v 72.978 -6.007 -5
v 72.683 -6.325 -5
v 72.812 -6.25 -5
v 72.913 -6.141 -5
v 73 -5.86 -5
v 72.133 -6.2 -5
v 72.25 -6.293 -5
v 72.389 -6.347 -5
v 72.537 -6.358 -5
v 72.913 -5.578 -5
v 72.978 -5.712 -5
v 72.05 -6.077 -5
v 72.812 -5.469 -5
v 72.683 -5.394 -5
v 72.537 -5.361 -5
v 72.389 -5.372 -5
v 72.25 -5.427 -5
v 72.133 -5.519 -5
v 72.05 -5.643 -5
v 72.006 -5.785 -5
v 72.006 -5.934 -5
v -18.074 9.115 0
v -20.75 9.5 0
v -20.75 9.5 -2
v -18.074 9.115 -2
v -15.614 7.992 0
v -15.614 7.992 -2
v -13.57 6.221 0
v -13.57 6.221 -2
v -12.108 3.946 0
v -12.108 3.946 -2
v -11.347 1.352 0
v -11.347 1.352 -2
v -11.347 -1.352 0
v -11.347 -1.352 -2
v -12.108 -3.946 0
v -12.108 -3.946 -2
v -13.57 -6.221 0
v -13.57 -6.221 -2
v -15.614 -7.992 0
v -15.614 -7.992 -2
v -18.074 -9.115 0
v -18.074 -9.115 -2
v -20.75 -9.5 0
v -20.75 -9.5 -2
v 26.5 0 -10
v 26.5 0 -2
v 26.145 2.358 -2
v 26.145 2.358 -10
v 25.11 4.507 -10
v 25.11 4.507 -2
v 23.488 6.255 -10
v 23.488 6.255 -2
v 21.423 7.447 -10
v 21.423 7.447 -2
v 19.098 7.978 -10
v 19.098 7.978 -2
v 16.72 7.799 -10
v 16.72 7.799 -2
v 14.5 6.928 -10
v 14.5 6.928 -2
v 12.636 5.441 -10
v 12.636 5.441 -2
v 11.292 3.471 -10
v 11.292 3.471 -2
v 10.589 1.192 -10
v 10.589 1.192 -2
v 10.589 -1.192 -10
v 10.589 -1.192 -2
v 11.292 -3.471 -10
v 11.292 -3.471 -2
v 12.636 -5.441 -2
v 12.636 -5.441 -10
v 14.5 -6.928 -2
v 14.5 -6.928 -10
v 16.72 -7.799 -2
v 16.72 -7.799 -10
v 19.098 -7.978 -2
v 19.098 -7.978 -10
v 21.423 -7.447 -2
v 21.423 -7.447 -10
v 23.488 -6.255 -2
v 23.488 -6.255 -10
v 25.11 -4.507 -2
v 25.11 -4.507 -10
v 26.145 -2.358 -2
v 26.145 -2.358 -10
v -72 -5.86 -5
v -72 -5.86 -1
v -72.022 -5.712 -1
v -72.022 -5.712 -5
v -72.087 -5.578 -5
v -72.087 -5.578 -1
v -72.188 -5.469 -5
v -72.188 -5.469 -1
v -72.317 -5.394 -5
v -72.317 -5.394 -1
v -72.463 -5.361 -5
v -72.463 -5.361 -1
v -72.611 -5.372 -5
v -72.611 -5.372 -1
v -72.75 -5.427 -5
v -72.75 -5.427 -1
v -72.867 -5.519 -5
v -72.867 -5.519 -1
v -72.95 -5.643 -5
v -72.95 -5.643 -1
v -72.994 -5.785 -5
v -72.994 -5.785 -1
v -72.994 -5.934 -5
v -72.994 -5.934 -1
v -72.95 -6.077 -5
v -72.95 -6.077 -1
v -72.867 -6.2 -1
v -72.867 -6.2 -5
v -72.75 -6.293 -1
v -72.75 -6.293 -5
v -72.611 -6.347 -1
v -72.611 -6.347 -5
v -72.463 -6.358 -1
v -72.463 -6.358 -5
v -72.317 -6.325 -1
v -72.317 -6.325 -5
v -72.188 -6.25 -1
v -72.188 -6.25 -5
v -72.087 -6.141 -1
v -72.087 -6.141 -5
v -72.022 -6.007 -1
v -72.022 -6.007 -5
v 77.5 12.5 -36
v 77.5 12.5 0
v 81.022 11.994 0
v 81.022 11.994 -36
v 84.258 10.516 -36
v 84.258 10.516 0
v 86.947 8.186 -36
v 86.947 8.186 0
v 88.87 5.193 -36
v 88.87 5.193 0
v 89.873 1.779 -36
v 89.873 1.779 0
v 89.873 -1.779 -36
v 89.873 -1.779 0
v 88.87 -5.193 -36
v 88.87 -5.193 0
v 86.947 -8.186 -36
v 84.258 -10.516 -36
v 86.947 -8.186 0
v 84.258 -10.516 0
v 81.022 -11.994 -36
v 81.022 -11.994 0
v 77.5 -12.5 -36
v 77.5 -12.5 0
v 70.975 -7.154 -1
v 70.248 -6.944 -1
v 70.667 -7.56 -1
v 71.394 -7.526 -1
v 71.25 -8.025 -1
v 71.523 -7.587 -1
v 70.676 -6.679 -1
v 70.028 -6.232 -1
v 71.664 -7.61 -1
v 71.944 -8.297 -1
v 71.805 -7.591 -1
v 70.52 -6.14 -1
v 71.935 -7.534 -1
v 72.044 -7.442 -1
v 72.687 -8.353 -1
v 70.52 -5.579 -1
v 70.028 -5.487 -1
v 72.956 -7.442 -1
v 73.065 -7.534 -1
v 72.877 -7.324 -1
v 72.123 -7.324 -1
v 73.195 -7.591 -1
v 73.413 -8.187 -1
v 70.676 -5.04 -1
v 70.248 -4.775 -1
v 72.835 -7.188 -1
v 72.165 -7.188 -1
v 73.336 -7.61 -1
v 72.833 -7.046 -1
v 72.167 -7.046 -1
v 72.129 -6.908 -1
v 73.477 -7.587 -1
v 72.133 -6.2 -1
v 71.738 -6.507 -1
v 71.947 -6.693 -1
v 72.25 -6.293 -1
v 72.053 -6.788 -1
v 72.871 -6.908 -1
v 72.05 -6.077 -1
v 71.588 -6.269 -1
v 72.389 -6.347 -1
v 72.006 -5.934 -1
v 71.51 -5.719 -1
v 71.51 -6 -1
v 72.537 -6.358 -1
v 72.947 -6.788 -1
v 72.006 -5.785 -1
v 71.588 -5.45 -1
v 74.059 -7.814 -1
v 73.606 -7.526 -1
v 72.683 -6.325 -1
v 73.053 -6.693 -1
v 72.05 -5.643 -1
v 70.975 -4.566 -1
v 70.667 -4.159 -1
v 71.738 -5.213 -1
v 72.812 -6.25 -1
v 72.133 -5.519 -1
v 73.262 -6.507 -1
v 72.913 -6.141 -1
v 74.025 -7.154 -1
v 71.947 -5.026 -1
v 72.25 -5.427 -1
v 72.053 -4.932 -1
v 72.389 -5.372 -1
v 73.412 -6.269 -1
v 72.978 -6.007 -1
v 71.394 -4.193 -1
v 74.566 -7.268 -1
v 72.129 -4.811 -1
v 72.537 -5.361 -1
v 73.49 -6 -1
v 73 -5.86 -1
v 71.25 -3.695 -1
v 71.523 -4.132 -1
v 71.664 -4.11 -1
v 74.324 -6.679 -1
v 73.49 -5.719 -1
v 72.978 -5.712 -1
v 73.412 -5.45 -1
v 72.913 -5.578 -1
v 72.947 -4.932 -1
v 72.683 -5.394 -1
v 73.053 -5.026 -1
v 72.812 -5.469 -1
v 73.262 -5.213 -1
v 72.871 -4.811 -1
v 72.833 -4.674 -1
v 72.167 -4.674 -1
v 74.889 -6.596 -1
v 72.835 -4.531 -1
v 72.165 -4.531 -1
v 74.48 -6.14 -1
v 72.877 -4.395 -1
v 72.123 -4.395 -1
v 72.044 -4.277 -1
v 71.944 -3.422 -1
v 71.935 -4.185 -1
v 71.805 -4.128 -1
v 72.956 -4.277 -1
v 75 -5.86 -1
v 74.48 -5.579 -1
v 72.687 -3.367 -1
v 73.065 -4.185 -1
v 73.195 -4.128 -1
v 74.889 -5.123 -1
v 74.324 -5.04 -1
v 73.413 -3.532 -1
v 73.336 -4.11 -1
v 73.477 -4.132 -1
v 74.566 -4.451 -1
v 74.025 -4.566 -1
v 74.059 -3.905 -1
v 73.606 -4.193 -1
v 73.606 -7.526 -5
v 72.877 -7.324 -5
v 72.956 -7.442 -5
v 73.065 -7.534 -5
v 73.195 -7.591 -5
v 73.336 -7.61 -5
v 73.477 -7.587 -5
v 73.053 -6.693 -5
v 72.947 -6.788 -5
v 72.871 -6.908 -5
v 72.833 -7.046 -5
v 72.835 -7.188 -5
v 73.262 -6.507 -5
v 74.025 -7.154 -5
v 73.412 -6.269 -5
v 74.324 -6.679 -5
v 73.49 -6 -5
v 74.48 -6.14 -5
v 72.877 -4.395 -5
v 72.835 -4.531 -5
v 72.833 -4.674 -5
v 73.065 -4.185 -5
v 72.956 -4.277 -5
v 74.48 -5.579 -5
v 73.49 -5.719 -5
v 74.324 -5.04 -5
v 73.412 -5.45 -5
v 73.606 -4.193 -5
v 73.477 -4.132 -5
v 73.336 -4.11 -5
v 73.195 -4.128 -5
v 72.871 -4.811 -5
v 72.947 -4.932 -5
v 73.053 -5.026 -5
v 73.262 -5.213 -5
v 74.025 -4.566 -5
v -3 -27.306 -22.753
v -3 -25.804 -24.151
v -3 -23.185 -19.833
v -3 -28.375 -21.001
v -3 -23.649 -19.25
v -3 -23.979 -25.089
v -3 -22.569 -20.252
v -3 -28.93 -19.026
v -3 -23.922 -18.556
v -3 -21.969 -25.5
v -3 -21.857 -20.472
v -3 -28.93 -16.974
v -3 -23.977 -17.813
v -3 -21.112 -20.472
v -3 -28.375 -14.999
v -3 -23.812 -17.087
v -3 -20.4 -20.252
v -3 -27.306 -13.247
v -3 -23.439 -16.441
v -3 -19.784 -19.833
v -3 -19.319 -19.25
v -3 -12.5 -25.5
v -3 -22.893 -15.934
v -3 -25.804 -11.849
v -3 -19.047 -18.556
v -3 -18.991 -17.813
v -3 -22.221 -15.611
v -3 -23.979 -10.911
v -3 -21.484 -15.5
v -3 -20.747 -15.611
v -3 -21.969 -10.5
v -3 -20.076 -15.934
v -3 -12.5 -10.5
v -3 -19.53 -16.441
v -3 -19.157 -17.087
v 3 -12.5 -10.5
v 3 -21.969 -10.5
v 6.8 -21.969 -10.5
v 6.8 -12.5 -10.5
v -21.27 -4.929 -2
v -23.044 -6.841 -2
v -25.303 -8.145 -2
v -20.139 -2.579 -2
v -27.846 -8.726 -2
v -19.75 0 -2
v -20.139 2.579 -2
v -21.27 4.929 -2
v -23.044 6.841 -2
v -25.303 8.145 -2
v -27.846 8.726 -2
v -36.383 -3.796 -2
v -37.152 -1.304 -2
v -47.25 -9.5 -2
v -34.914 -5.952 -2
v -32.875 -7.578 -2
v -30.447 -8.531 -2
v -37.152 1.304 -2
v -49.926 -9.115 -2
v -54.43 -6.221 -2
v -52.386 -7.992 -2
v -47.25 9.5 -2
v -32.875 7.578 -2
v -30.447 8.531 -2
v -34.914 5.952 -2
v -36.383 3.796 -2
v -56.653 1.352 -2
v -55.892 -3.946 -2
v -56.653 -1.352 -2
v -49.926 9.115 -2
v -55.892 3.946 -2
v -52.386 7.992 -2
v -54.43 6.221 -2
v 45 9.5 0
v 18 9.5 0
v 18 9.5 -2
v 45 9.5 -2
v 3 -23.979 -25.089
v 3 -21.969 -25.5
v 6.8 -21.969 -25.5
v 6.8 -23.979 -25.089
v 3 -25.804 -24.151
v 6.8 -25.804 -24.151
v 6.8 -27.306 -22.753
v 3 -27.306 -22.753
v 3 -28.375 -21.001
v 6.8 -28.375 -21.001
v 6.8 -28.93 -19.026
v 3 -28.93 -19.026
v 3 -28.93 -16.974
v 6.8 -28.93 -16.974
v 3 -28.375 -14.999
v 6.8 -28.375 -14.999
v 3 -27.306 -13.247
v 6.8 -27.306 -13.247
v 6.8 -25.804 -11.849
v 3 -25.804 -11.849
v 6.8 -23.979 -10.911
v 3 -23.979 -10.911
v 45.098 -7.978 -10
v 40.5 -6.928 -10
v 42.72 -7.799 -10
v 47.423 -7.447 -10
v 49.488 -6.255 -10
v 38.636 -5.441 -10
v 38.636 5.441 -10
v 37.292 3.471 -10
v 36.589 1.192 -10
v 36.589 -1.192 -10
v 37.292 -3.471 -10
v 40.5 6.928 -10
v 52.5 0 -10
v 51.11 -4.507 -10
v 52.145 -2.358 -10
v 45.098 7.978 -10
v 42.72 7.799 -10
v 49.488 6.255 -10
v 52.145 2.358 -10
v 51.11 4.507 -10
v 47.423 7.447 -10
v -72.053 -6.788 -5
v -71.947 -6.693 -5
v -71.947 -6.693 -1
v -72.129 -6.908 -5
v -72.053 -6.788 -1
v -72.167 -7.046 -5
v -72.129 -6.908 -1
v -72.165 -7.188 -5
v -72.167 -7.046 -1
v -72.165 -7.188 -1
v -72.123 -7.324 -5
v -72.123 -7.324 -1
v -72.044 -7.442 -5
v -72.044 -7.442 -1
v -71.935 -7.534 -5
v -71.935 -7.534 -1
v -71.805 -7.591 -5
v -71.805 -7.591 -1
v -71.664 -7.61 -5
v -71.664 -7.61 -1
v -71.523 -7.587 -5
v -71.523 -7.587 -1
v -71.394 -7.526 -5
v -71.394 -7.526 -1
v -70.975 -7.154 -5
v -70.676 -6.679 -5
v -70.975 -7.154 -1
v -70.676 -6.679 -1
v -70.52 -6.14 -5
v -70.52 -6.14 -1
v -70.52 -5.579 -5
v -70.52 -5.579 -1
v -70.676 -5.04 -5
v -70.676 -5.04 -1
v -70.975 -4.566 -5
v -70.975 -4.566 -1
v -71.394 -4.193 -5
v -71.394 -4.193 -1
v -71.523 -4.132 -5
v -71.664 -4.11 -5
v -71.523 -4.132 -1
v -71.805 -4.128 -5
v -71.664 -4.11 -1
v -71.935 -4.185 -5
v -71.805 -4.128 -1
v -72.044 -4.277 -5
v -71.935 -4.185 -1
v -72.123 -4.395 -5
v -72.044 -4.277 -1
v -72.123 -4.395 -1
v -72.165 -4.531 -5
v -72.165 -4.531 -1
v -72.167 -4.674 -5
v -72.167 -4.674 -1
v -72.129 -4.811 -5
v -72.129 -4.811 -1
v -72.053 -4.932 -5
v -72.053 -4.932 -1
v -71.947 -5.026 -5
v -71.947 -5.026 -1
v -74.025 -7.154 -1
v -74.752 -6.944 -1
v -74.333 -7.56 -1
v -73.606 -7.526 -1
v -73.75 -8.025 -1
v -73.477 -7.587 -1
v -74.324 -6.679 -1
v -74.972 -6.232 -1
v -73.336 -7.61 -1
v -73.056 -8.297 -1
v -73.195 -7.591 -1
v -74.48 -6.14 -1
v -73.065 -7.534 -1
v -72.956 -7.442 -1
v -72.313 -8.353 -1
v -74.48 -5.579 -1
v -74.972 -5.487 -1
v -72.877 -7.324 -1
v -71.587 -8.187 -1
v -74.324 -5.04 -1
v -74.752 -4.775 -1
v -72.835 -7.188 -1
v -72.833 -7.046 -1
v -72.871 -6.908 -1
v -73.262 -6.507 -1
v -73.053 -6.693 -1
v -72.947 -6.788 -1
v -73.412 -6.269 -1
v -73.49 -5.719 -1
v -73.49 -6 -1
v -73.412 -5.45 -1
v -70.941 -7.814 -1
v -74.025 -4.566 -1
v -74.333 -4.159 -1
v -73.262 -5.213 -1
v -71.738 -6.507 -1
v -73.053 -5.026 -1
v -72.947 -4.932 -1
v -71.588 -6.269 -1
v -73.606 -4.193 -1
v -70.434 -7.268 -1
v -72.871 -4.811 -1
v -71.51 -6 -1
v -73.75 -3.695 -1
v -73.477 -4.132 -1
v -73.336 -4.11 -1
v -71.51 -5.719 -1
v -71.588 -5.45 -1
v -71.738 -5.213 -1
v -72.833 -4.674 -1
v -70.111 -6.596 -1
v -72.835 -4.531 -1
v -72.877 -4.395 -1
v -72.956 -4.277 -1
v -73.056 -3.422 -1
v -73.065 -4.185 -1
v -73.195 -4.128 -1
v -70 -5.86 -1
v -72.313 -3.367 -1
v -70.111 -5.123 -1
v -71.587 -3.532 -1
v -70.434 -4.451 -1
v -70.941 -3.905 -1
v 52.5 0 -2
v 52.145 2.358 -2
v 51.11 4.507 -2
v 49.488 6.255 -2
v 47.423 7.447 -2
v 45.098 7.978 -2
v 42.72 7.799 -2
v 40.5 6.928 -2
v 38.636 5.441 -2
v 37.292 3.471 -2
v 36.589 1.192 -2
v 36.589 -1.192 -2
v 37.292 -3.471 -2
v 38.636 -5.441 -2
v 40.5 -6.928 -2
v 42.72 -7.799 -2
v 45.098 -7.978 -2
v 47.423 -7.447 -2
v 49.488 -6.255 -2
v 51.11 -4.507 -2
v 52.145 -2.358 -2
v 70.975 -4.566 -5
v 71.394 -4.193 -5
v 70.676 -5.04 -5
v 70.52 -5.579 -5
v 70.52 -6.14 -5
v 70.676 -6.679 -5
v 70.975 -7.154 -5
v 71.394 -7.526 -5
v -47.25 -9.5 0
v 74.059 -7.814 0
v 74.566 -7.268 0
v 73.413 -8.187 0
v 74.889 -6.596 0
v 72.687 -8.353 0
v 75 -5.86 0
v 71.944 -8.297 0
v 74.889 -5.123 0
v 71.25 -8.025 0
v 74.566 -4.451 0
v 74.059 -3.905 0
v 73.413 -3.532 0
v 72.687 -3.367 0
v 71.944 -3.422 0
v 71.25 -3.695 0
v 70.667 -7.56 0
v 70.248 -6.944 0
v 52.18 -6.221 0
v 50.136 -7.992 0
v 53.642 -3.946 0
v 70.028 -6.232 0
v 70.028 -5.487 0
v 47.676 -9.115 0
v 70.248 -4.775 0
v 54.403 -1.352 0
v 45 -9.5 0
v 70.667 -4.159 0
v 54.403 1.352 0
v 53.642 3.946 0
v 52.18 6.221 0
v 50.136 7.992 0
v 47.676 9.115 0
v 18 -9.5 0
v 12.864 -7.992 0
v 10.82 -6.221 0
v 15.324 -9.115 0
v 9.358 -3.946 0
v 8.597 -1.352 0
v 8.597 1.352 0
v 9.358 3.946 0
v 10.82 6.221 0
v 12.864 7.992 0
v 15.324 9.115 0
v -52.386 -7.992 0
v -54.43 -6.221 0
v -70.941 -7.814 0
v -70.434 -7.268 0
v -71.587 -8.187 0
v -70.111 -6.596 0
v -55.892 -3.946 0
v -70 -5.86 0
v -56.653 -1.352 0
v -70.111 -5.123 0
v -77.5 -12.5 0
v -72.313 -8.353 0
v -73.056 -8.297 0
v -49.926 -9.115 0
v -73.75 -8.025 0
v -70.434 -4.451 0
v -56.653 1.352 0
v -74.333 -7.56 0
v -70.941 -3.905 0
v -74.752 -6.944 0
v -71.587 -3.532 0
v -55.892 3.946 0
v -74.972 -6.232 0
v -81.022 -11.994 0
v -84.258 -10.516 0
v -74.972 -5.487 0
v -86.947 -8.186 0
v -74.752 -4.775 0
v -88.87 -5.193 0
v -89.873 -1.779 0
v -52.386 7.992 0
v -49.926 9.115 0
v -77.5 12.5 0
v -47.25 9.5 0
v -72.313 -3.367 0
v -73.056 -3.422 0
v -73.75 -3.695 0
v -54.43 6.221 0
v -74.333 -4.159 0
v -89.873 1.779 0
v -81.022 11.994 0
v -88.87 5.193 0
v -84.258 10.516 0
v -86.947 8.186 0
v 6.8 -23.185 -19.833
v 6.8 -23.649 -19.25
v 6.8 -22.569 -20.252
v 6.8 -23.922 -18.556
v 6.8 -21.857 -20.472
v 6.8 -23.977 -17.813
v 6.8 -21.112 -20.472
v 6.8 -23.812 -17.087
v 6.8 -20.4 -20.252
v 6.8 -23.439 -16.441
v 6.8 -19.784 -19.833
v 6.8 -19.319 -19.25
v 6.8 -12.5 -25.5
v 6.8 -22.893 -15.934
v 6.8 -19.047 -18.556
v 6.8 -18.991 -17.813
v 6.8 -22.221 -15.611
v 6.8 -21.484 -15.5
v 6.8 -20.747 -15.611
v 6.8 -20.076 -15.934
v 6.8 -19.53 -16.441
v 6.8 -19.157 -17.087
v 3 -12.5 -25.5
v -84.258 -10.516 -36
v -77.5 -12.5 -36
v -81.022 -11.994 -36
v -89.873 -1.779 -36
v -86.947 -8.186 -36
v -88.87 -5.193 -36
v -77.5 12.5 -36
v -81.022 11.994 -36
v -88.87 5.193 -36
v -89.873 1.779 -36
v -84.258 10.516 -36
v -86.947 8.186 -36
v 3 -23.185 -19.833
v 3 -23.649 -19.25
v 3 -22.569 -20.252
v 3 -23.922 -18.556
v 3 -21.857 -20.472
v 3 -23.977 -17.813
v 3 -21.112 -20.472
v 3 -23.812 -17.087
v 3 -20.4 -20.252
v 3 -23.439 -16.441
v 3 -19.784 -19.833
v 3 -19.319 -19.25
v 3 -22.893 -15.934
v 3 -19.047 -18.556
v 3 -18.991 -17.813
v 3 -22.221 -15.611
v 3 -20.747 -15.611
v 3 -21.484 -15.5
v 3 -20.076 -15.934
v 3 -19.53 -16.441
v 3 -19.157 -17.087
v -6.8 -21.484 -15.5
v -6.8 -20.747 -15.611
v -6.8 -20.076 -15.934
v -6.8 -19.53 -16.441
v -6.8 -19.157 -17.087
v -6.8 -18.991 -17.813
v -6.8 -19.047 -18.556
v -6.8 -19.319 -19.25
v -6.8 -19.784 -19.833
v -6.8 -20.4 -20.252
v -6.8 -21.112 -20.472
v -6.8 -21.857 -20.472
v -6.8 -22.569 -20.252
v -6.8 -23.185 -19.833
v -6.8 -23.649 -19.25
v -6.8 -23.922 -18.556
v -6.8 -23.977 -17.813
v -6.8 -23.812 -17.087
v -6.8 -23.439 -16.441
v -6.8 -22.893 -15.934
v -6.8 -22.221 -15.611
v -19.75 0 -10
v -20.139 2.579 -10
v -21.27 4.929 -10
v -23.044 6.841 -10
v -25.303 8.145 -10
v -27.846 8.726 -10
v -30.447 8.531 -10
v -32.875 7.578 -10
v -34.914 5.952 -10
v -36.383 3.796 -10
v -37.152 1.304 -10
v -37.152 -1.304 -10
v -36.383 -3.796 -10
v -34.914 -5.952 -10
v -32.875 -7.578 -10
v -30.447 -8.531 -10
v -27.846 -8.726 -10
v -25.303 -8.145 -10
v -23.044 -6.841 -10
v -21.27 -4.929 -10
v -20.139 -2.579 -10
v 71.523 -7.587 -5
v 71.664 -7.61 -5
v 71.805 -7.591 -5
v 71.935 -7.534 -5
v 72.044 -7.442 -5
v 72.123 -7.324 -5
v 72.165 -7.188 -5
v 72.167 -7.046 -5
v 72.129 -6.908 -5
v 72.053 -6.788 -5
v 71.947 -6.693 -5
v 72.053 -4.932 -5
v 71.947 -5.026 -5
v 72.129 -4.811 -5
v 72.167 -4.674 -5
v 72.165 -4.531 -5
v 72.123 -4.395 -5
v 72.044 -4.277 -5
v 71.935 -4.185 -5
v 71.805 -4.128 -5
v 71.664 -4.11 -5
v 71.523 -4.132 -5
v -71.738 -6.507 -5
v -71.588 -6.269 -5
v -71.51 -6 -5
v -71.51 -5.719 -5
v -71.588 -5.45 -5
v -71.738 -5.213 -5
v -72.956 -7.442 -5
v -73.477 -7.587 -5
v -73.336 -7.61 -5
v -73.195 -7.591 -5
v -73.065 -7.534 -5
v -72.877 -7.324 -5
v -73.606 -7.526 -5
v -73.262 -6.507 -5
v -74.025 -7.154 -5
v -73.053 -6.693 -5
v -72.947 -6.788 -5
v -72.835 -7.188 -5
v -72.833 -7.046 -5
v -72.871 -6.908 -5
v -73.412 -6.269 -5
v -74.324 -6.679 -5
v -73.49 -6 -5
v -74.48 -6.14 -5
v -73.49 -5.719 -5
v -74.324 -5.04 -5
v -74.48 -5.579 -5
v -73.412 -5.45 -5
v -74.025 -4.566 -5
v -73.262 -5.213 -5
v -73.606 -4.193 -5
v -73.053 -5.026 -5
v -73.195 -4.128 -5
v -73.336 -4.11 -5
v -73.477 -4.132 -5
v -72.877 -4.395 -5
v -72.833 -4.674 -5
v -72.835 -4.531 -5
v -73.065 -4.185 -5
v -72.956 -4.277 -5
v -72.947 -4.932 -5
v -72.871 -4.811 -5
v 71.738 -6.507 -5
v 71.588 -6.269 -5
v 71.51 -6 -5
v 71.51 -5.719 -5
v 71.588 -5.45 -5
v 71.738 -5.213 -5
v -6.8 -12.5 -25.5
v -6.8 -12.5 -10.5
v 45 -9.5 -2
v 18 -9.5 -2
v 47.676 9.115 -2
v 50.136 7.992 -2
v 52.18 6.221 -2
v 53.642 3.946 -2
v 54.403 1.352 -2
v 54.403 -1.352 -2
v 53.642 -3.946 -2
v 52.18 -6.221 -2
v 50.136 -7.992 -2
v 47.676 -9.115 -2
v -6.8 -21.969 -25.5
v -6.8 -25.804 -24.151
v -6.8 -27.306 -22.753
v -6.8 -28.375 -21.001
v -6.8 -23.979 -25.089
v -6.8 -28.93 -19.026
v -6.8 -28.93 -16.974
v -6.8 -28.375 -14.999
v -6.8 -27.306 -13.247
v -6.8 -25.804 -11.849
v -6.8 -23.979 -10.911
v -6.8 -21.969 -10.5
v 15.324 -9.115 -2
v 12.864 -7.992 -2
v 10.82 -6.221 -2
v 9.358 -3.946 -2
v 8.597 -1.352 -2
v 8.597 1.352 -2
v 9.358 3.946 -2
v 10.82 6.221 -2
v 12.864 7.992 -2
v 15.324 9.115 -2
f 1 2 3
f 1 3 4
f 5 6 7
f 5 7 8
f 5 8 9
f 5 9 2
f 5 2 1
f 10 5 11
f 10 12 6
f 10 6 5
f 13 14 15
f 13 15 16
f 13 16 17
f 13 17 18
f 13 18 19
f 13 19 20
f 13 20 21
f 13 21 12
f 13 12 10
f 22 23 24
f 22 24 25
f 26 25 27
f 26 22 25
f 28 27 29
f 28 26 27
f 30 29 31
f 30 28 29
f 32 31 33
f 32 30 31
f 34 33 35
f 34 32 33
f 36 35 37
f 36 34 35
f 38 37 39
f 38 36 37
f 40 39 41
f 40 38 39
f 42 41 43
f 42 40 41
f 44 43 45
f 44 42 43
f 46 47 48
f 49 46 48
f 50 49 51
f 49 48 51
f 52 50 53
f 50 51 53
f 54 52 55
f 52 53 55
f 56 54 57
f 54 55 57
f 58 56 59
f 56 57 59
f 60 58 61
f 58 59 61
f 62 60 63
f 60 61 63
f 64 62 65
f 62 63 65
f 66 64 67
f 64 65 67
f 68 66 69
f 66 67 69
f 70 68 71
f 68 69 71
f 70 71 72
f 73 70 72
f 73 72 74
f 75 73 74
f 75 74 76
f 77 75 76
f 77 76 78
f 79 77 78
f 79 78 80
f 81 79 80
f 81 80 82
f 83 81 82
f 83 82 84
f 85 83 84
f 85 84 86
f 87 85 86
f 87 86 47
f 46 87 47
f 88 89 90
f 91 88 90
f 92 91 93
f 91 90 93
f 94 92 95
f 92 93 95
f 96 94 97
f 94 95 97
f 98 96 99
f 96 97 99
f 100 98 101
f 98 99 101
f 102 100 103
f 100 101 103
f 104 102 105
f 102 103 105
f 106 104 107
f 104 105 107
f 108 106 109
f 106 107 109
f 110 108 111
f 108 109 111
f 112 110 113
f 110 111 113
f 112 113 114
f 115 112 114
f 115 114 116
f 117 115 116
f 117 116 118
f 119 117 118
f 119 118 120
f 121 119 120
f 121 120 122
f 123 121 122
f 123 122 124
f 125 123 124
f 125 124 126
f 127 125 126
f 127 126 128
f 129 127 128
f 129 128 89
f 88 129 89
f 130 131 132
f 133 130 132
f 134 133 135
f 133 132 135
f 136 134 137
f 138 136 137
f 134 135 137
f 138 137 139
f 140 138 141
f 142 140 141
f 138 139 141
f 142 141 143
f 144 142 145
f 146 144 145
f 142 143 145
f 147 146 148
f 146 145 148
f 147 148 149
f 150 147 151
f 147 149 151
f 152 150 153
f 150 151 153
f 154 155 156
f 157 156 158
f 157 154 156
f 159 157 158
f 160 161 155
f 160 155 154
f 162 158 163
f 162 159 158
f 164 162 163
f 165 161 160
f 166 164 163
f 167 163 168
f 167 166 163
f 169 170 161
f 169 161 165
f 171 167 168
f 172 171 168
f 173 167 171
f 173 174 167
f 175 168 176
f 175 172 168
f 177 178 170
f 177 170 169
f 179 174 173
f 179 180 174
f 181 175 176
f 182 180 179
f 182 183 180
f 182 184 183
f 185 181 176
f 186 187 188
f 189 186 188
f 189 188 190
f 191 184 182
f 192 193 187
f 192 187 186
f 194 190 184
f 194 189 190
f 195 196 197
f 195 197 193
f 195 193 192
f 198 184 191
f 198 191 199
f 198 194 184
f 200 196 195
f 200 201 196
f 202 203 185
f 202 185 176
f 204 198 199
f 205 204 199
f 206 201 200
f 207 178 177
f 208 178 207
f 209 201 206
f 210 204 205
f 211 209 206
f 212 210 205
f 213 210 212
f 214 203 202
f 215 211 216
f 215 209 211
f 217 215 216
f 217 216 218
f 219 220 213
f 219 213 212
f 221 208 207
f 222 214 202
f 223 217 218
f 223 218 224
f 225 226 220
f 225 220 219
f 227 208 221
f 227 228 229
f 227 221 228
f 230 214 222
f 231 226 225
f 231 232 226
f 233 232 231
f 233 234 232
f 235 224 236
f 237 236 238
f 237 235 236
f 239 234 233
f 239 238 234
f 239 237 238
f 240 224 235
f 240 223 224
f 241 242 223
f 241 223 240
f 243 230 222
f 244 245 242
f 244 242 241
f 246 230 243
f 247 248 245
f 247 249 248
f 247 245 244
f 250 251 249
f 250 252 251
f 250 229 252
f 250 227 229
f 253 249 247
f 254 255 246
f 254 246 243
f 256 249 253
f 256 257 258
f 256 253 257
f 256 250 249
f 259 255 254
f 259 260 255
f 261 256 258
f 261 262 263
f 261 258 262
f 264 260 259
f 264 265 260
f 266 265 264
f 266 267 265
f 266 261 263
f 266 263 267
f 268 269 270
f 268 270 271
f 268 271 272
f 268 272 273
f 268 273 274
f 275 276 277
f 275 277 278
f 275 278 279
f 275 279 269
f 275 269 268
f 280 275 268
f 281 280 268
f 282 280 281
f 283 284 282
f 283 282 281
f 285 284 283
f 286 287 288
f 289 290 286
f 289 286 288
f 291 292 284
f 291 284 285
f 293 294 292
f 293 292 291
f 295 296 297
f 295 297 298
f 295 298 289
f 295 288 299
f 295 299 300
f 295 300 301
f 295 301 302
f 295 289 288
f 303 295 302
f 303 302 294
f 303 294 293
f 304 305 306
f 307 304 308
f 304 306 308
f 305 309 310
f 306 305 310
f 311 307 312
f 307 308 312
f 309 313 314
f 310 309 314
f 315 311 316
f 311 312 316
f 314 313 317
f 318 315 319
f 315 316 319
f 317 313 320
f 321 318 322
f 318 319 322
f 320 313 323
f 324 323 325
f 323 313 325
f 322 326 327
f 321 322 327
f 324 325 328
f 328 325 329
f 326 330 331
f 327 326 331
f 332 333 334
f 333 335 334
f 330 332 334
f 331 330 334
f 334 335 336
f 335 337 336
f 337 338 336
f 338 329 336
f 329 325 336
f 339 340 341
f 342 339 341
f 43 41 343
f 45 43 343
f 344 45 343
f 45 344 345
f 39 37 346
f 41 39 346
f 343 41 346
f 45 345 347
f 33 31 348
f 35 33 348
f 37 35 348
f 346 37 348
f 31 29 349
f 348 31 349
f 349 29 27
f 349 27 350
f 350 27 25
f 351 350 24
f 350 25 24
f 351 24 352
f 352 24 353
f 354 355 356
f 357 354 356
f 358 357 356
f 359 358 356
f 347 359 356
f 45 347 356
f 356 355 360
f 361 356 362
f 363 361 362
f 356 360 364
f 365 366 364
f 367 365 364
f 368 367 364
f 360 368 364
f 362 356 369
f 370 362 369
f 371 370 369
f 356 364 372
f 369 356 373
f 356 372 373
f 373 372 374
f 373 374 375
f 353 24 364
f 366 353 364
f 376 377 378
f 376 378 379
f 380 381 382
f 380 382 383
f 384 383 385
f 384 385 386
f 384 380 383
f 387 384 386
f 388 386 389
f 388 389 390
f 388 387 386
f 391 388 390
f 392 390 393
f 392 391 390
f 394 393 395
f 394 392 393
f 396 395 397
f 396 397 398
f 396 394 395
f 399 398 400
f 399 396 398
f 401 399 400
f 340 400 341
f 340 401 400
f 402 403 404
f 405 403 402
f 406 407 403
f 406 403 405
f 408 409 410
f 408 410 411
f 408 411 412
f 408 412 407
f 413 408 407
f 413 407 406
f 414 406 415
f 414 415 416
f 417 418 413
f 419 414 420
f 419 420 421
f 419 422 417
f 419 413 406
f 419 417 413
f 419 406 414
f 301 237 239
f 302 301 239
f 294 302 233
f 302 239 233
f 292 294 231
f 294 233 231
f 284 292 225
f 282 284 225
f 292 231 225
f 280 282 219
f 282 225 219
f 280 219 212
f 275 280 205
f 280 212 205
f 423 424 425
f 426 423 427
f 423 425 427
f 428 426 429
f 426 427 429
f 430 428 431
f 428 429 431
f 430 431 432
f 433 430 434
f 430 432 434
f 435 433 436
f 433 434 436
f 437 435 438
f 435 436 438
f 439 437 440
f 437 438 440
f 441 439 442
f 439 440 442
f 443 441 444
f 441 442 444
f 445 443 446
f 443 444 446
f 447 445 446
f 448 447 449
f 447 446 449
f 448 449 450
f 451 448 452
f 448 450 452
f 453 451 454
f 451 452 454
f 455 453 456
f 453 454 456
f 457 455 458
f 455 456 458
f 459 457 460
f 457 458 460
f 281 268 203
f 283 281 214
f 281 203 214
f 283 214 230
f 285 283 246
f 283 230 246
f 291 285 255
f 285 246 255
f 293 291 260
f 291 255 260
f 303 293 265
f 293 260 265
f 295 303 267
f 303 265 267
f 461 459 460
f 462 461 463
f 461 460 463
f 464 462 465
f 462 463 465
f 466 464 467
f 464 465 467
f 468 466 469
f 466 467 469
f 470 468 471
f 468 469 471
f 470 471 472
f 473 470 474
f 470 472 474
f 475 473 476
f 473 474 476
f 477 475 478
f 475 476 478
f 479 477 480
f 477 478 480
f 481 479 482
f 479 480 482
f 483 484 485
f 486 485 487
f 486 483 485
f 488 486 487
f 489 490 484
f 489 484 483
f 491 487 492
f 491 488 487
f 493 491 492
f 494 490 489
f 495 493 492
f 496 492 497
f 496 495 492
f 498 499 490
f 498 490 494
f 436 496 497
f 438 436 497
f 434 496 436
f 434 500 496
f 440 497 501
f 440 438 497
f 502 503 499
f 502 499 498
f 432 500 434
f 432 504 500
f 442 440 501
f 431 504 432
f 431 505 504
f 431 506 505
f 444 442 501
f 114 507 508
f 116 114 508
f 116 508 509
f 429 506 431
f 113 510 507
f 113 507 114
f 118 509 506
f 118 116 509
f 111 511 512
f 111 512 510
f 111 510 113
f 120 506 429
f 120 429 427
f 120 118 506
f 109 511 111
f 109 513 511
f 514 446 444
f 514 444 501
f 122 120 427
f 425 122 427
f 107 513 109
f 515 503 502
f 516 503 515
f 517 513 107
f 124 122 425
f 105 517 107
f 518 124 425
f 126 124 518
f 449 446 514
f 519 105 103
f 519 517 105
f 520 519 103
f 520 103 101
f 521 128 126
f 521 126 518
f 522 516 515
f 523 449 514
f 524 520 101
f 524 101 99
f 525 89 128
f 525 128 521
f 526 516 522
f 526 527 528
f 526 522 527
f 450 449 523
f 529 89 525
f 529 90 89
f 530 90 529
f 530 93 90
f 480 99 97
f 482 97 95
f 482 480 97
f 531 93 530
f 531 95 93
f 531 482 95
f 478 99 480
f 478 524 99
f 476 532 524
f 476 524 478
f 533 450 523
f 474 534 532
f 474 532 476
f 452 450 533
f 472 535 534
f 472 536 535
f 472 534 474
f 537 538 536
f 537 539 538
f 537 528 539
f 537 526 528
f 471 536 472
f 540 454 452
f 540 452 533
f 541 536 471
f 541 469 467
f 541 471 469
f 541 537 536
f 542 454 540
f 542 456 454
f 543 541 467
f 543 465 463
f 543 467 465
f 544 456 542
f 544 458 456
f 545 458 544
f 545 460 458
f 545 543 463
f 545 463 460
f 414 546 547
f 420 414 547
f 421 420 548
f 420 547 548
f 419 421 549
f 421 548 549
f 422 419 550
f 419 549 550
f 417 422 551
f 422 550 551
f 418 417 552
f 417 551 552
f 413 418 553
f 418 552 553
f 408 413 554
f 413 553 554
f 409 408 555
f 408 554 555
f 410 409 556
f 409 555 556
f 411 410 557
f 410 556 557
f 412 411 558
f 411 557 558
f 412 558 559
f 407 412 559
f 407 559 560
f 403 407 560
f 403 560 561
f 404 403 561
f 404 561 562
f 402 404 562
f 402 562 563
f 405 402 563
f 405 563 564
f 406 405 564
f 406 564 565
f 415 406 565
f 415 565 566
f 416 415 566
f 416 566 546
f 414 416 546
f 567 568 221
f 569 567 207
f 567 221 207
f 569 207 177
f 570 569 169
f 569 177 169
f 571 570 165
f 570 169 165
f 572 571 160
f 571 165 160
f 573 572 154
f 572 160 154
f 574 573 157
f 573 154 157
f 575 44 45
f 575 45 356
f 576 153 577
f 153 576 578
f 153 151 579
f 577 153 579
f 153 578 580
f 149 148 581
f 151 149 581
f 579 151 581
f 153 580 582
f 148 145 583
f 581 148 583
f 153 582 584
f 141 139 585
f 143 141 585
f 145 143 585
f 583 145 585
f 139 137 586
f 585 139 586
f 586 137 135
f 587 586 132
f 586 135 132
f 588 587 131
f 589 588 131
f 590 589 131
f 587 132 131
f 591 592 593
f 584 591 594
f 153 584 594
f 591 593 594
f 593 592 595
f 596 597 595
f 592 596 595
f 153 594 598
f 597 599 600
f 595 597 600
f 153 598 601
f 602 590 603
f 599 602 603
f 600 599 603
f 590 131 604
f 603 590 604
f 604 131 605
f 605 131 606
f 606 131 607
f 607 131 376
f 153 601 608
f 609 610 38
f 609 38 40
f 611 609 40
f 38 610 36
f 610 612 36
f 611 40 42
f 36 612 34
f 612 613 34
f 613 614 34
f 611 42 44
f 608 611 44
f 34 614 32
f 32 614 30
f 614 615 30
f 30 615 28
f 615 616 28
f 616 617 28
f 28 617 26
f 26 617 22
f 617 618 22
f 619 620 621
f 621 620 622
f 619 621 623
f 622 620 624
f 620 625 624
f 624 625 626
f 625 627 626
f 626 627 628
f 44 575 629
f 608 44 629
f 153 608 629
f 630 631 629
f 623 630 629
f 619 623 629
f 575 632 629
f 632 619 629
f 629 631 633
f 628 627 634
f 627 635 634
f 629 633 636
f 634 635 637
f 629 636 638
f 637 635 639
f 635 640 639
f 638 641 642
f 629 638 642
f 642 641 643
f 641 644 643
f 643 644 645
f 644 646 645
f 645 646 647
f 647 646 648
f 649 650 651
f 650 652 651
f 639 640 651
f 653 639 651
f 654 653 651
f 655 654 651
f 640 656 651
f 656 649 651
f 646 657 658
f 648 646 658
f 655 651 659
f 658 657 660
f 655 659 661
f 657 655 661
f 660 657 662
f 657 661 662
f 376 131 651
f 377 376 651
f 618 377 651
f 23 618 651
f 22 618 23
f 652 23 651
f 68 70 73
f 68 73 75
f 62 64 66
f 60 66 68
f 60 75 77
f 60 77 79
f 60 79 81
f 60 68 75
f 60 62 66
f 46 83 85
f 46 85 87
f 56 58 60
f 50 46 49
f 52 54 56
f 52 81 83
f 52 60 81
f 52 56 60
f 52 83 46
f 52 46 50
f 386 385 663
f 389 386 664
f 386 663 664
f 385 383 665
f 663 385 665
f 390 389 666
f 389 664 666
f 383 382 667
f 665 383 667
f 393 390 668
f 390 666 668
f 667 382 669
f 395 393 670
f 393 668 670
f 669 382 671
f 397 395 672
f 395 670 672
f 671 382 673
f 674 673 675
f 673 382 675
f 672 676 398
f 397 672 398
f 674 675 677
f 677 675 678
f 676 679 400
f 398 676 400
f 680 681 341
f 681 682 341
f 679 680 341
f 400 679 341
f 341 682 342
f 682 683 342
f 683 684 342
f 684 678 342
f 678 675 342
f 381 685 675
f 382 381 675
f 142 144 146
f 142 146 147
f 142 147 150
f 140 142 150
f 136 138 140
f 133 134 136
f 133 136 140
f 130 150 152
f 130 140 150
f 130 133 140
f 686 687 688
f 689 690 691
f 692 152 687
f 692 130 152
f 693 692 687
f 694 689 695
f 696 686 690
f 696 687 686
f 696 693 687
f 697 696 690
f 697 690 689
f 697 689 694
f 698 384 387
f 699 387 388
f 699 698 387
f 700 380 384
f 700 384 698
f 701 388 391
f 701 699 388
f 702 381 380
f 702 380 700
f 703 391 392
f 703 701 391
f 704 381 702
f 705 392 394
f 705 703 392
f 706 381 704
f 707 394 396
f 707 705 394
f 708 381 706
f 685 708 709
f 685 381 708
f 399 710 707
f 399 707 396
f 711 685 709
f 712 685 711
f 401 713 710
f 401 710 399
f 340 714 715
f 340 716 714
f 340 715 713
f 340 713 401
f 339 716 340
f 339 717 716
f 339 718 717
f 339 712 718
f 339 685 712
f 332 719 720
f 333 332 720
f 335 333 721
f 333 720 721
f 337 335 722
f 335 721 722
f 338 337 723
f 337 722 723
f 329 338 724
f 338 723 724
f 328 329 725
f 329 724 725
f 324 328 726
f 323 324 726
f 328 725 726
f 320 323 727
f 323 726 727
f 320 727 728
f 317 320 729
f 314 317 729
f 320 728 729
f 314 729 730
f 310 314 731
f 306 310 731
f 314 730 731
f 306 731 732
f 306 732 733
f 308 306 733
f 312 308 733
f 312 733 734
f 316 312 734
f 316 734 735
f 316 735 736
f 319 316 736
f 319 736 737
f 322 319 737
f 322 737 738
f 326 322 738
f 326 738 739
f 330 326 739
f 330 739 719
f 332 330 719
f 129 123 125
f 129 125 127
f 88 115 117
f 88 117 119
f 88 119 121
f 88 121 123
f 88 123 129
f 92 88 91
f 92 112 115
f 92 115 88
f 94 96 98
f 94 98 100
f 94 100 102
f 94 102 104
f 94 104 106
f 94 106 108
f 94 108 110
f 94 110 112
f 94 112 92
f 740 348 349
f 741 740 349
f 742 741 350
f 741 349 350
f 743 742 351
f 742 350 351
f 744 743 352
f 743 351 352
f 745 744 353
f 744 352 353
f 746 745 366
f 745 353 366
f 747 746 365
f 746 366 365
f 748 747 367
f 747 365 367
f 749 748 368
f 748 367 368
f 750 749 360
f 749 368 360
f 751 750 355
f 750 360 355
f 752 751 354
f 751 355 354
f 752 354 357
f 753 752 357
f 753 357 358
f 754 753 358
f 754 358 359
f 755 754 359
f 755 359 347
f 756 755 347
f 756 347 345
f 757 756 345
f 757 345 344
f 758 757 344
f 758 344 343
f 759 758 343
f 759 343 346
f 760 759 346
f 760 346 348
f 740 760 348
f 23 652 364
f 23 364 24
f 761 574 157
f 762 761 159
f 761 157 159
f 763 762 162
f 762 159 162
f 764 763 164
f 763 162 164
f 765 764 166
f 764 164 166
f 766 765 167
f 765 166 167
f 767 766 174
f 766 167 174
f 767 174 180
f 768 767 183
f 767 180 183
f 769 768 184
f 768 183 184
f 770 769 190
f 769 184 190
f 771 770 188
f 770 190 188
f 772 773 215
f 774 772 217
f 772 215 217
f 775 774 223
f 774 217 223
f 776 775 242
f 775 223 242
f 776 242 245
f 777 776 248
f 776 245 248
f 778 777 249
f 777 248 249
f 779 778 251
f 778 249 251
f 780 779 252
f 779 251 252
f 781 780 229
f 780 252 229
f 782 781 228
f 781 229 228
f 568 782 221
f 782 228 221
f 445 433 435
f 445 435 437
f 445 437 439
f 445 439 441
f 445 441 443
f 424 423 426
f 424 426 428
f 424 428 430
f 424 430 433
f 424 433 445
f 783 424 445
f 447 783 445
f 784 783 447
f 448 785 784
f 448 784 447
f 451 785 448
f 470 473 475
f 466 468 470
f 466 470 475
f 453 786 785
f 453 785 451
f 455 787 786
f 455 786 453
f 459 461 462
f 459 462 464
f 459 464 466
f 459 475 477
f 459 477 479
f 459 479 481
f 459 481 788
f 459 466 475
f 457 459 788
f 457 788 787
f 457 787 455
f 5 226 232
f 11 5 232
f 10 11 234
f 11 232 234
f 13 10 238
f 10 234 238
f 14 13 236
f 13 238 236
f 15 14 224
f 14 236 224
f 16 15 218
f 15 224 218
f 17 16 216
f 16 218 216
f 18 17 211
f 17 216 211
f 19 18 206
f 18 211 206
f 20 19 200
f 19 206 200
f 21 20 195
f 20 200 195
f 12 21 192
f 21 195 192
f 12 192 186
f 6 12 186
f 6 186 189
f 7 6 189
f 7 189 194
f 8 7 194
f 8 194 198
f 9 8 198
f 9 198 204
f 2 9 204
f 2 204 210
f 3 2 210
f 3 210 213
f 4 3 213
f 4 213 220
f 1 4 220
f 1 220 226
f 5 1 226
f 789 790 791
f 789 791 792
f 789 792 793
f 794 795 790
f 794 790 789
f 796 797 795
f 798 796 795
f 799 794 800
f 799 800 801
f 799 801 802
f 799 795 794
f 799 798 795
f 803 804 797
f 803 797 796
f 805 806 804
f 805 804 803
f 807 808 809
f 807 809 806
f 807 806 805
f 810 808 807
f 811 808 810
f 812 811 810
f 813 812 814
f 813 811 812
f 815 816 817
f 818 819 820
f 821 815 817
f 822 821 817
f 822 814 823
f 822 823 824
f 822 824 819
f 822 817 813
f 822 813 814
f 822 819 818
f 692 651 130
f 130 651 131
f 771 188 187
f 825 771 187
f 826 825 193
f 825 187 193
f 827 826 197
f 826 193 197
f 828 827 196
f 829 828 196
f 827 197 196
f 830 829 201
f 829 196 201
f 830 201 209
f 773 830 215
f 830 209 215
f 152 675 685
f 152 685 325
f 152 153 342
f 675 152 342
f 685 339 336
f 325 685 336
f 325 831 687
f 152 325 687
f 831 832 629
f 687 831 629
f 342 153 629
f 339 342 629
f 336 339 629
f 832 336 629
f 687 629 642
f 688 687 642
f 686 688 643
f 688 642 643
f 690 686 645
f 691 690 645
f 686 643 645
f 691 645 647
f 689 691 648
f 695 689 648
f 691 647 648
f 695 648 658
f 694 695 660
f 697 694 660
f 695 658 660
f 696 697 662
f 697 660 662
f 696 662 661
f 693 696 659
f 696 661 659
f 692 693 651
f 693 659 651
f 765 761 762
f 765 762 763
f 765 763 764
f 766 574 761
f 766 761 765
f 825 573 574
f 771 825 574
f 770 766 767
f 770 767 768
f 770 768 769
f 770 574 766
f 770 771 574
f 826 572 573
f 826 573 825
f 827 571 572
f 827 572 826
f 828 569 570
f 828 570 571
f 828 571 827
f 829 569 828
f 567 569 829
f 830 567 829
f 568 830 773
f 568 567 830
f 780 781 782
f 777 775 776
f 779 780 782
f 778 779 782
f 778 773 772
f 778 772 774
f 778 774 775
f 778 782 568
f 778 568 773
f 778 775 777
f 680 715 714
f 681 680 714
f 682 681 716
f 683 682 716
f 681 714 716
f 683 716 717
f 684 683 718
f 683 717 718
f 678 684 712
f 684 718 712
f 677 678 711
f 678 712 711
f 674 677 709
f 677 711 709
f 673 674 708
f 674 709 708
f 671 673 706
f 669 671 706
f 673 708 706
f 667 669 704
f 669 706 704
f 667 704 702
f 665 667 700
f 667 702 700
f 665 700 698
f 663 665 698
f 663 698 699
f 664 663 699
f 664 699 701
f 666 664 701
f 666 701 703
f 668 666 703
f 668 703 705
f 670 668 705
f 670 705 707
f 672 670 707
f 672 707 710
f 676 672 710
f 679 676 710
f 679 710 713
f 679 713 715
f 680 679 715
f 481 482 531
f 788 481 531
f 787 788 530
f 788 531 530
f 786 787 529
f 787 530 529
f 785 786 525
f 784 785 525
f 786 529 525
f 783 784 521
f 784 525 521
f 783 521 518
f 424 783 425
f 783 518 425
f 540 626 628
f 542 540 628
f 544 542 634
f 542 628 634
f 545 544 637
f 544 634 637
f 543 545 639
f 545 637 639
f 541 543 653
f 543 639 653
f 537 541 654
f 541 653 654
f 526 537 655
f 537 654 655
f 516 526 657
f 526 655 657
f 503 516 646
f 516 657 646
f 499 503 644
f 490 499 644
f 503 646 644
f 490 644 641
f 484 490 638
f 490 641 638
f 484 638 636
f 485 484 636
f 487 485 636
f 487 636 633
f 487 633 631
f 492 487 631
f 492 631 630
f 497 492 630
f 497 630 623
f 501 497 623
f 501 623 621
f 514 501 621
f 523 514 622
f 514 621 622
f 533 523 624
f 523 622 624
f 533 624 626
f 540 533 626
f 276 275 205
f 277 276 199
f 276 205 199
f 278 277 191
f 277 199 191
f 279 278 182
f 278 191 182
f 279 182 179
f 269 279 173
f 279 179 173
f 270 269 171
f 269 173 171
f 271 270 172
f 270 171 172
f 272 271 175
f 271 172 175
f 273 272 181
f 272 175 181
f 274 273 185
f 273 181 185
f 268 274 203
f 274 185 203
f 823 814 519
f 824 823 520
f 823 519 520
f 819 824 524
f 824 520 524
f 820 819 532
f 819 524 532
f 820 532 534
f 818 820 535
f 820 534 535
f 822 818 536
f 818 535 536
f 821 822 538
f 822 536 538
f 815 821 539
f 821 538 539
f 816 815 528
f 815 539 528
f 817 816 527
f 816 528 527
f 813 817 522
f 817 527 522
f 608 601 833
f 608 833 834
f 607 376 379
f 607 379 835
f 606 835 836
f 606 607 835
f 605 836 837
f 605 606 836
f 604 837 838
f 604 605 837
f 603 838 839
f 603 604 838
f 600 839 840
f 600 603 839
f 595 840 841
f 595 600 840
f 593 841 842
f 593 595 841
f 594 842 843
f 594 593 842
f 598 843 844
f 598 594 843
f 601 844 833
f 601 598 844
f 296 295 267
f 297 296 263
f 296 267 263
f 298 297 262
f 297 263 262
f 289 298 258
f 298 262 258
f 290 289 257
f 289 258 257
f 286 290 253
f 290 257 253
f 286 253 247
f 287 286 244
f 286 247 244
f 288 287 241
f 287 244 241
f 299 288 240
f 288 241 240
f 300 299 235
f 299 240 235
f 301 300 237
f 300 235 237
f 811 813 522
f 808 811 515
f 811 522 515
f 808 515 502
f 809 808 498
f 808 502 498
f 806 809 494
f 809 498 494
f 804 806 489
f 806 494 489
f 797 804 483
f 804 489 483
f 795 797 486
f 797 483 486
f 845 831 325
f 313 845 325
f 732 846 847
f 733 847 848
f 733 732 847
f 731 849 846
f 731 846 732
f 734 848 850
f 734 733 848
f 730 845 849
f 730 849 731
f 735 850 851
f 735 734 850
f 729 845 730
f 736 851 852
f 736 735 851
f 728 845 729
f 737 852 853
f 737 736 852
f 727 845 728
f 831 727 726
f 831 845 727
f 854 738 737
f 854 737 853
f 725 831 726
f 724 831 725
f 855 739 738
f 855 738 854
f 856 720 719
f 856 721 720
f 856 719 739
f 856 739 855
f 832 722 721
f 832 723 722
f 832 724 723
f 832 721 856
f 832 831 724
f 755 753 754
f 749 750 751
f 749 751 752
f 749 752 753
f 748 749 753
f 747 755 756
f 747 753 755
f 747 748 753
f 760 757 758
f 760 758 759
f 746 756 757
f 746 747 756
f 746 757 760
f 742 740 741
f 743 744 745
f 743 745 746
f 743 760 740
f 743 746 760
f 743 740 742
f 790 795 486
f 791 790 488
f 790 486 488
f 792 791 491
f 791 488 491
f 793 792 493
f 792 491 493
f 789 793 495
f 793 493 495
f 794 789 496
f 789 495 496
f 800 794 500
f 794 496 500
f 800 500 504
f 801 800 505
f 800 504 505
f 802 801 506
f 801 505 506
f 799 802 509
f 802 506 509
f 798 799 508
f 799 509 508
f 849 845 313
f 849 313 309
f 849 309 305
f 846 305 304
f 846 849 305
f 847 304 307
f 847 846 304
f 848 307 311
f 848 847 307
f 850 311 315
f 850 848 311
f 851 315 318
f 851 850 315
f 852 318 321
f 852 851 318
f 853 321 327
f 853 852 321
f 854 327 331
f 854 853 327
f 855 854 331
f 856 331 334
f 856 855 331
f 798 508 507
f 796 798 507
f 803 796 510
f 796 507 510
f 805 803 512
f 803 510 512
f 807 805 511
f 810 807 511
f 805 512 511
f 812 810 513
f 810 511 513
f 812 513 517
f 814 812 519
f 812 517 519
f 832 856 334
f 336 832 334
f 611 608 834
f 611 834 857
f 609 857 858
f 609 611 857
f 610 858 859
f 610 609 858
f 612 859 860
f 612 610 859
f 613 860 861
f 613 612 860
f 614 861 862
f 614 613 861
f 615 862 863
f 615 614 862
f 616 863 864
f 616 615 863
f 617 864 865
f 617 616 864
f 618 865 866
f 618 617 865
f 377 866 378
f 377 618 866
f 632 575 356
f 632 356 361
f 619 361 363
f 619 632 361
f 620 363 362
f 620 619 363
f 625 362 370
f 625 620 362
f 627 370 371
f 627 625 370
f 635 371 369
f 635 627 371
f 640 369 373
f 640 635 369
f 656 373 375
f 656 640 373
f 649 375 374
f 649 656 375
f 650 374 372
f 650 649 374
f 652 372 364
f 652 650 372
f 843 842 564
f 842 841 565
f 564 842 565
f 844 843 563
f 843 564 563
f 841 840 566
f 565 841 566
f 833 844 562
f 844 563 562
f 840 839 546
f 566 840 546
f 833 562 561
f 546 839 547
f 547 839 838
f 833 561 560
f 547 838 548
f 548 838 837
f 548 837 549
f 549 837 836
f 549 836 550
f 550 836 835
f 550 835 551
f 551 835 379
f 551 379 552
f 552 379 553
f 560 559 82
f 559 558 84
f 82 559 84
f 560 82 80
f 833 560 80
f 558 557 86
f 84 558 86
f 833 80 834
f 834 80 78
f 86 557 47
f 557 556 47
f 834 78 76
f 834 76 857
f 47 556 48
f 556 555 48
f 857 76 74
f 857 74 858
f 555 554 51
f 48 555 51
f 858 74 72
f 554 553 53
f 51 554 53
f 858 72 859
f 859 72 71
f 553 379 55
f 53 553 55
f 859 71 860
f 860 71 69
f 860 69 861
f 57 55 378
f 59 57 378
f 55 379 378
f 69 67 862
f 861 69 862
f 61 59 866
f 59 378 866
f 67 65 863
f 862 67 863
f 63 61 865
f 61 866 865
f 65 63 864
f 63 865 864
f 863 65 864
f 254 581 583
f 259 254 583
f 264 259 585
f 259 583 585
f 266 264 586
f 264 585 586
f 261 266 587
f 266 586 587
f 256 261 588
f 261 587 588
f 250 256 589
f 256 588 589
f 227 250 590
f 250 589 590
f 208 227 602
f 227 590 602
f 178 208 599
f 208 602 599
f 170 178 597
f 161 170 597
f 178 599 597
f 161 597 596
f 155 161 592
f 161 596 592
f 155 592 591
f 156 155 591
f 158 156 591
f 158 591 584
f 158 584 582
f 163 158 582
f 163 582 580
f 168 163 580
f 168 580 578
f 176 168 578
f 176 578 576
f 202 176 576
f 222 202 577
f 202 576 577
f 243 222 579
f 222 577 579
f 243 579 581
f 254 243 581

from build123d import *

# Parameters (mm, degrees)
BOSS_EXTRUDE1_DEPTH     = 36
SKETCH3_R               = 8.75
SKETCH3_R_2             = 8
CUT_EXTRUDE1_DEPTH      = 10
CUT_EXTRUDE2_DEPTH      = 2
SKETCH5_R               = 2.5
CUT_EXTRUDE3_DEPTH      = 1
SKETCH6_R               = 0.5
CUT_EXTRUDE4_DEPTH      = 5
SKETCH7_W               = 3.8
SKETCH7_H               = 15
BOSS_EXTRUDE2_DEPTH     = 17
SKETCH8_R               = 2.5
CUT_EXTRUDE5_DEPTH      = 84.2
CUT_EXTRUDE5_DEPTH_BACK = 97.8


with BuildPart() as part:
    # Sketch1 → Boss-Extrude1 (new body)
    with BuildSketch(Plane.XY):
        with BuildLine():
            Line((-77.5, 12.5), (77.5, 12.5))
            ThreePointArc((77.5, 12.5), (90, 0), (77.5, -12.5))
            Line((77.5, -12.5), (-77.5, -12.5))
            ThreePointArc((-77.5, -12.5), (-90, 0), (-77.5, 12.5))
        make_face()
    extrude(amount=-BOSS_EXTRUDE1_DEPTH)

    # Sketch3 → Cut-Extrude1 (cut)
    with BuildSketch(Plane.XY):
        with Locations((-28.5, 0)):
            Circle(SKETCH3_R)
        with Locations((18.5, 0)):
            Circle(SKETCH3_R_2)
        with Locations((44.5, 0)):
            Circle(SKETCH3_R_2)
    extrude(amount=-CUT_EXTRUDE1_DEPTH, mode=Mode.SUBTRACT)

    # Sketch4 → Cut-Extrude2 (cut)
    with BuildSketch(Plane.XY):
        with BuildLine():
            Line((-47.25, 9.5), (-20.75, 9.5))
            ThreePointArc((-20.75, 9.5), (-11.25, 0), (-20.75, -9.5))
            Line((-20.75, -9.5), (-47.25, -9.5))
            ThreePointArc((-47.25, -9.5), (-56.75, 0), (-47.25, 9.5))
        make_face()
        with BuildLine():
            Line((18, 9.5), (45, 9.5))
            ThreePointArc((45, 9.5), (54.5, 0), (45, -9.5))
            Line((45, -9.5), (18, -9.5))
            ThreePointArc((18, -9.5), (8.5, 0), (18, 9.5))
        make_face()
    extrude(amount=-CUT_EXTRUDE2_DEPTH, mode=Mode.SUBTRACT)

    # Sketch5 → Cut-Extrude3 (cut)
    with BuildSketch(Plane.XY):
        with Locations((72.5, -5.85958214)):
            Circle(SKETCH5_R)
        with Locations((-72.5, -5.85958214)):
            Circle(SKETCH5_R)
    extrude(amount=-CUT_EXTRUDE3_DEPTH, mode=Mode.SUBTRACT)

    # Sketch6 → Cut-Extrude4 (cut)
    with BuildSketch(Plane.XY):
        with Locations((-72.5, -5.85958214)):
            Circle(SKETCH6_R)
        with Locations((72.5, -5.85958214)):
            Circle(SKETCH6_R)
        with BuildLine():
            ThreePointArc((-71.394458403, -7.526248807), (-70.5, -5.85958214), (-71.394458403, -4.192915474))
            ThreePointArc((-71.394458403, -4.192915474), (-72.087510469, -4.333196741), (-71.947229202, -5.026248807))
            ThreePointArc((-71.947229202, -5.026248807), (-71.5, -5.85958214), (-71.947229202, -6.692915474))
            ThreePointArc((-71.947229202, -6.692915474), (-72.087510469, -7.385967539), (-71.394458403, -7.526248807))
        make_face()
        with BuildLine():
            ThreePointArc((-73.605541597, -4.192915474), (-74.5, -5.85958214), (-73.605541597, -7.526248807))
            ThreePointArc((-73.605541597, -7.526248807), (-72.912489531, -7.385967539), (-73.052770798, -6.692915474))
            ThreePointArc((-73.052770798, -6.692915474), (-73.5, -5.85958214), (-73.052770798, -5.026248807))
            ThreePointArc((-73.052770798, -5.026248807), (-72.912489531, -4.333196741), (-73.605541597, -4.192915474))
        make_face()
        with BuildLine():
            ThreePointArc((73.605541597, -7.526248807), (74.5, -5.85958214), (73.605541597, -4.192915474))
            ThreePointArc((73.605541597, -4.192915474), (72.912489531, -4.333196741), (73.052770798, -5.026248807))
            ThreePointArc((73.052770798, -5.026248807), (73.5, -5.85958214), (73.052770798, -6.692915474))
            ThreePointArc((73.052770798, -6.692915474), (72.912489531, -7.385967539), (73.605541597, -7.526248807))
        make_face()
        with BuildLine():
            ThreePointArc((71.394458403, -4.192915474), (70.5, -5.85958214), (71.394458403, -7.526248807))
            ThreePointArc((71.394458403, -7.526248807), (72.087510469, -7.385967539), (71.947229202, -6.692915474))
            ThreePointArc((71.947229202, -6.692915474), (71.5, -5.85958214), (71.947229202, -5.026248807))
            ThreePointArc((71.947229202, -5.026248807), (72.087510469, -4.333196741), (71.394458403, -4.192915474))
        make_face()
    extrude(amount=-CUT_EXTRUDE4_DEPTH, mode=Mode.SUBTRACT)

    # Sketch7 → Boss-Extrude2 (add)
    with BuildSketch(Plane.XZ.offset(12.5)):
        with Locations((4.9, -18)):
            Rectangle(SKETCH7_W, SKETCH7_H)
        with Locations((-4.9, -18)):
            Rectangle(SKETCH7_W, SKETCH7_H)
    extrude(amount=BOSS_EXTRUDE2_DEPTH)

    # Sketch8 → Cut-Extrude5 (cut, two sides)
    with BuildSketch(Plane.ZY.offset(6.8)) as cut_extrude5_sk:
        with Locations((-18, -21.484376944)):
            Circle(SKETCH8_R)
        with BuildLine():
            Line((-10.5, -21), (-7.903352706, -21))
            Line((-7.903352706, -21), (-7.606016941, -33.928608258))
            Line((-7.606016941, -33.928608258), (-27.603723976, -34.388521143))
            Line((-27.603723976, -34.388521143), (-27.603723976, -21))
            Line((-27.603723976, -21), (-25.5, -21))
            ThreePointArc((-25.5, -21), (-18, -29.00000207), (-10.5, -21))
        make_face()
    extrude(amount=CUT_EXTRUDE5_DEPTH, mode=Mode.SUBTRACT)
    extrude(cut_extrude5_sk.sketch, amount=-CUT_EXTRUDE5_DEPTH_BACK, mode=Mode.SUBTRACT)


solid = part.part
